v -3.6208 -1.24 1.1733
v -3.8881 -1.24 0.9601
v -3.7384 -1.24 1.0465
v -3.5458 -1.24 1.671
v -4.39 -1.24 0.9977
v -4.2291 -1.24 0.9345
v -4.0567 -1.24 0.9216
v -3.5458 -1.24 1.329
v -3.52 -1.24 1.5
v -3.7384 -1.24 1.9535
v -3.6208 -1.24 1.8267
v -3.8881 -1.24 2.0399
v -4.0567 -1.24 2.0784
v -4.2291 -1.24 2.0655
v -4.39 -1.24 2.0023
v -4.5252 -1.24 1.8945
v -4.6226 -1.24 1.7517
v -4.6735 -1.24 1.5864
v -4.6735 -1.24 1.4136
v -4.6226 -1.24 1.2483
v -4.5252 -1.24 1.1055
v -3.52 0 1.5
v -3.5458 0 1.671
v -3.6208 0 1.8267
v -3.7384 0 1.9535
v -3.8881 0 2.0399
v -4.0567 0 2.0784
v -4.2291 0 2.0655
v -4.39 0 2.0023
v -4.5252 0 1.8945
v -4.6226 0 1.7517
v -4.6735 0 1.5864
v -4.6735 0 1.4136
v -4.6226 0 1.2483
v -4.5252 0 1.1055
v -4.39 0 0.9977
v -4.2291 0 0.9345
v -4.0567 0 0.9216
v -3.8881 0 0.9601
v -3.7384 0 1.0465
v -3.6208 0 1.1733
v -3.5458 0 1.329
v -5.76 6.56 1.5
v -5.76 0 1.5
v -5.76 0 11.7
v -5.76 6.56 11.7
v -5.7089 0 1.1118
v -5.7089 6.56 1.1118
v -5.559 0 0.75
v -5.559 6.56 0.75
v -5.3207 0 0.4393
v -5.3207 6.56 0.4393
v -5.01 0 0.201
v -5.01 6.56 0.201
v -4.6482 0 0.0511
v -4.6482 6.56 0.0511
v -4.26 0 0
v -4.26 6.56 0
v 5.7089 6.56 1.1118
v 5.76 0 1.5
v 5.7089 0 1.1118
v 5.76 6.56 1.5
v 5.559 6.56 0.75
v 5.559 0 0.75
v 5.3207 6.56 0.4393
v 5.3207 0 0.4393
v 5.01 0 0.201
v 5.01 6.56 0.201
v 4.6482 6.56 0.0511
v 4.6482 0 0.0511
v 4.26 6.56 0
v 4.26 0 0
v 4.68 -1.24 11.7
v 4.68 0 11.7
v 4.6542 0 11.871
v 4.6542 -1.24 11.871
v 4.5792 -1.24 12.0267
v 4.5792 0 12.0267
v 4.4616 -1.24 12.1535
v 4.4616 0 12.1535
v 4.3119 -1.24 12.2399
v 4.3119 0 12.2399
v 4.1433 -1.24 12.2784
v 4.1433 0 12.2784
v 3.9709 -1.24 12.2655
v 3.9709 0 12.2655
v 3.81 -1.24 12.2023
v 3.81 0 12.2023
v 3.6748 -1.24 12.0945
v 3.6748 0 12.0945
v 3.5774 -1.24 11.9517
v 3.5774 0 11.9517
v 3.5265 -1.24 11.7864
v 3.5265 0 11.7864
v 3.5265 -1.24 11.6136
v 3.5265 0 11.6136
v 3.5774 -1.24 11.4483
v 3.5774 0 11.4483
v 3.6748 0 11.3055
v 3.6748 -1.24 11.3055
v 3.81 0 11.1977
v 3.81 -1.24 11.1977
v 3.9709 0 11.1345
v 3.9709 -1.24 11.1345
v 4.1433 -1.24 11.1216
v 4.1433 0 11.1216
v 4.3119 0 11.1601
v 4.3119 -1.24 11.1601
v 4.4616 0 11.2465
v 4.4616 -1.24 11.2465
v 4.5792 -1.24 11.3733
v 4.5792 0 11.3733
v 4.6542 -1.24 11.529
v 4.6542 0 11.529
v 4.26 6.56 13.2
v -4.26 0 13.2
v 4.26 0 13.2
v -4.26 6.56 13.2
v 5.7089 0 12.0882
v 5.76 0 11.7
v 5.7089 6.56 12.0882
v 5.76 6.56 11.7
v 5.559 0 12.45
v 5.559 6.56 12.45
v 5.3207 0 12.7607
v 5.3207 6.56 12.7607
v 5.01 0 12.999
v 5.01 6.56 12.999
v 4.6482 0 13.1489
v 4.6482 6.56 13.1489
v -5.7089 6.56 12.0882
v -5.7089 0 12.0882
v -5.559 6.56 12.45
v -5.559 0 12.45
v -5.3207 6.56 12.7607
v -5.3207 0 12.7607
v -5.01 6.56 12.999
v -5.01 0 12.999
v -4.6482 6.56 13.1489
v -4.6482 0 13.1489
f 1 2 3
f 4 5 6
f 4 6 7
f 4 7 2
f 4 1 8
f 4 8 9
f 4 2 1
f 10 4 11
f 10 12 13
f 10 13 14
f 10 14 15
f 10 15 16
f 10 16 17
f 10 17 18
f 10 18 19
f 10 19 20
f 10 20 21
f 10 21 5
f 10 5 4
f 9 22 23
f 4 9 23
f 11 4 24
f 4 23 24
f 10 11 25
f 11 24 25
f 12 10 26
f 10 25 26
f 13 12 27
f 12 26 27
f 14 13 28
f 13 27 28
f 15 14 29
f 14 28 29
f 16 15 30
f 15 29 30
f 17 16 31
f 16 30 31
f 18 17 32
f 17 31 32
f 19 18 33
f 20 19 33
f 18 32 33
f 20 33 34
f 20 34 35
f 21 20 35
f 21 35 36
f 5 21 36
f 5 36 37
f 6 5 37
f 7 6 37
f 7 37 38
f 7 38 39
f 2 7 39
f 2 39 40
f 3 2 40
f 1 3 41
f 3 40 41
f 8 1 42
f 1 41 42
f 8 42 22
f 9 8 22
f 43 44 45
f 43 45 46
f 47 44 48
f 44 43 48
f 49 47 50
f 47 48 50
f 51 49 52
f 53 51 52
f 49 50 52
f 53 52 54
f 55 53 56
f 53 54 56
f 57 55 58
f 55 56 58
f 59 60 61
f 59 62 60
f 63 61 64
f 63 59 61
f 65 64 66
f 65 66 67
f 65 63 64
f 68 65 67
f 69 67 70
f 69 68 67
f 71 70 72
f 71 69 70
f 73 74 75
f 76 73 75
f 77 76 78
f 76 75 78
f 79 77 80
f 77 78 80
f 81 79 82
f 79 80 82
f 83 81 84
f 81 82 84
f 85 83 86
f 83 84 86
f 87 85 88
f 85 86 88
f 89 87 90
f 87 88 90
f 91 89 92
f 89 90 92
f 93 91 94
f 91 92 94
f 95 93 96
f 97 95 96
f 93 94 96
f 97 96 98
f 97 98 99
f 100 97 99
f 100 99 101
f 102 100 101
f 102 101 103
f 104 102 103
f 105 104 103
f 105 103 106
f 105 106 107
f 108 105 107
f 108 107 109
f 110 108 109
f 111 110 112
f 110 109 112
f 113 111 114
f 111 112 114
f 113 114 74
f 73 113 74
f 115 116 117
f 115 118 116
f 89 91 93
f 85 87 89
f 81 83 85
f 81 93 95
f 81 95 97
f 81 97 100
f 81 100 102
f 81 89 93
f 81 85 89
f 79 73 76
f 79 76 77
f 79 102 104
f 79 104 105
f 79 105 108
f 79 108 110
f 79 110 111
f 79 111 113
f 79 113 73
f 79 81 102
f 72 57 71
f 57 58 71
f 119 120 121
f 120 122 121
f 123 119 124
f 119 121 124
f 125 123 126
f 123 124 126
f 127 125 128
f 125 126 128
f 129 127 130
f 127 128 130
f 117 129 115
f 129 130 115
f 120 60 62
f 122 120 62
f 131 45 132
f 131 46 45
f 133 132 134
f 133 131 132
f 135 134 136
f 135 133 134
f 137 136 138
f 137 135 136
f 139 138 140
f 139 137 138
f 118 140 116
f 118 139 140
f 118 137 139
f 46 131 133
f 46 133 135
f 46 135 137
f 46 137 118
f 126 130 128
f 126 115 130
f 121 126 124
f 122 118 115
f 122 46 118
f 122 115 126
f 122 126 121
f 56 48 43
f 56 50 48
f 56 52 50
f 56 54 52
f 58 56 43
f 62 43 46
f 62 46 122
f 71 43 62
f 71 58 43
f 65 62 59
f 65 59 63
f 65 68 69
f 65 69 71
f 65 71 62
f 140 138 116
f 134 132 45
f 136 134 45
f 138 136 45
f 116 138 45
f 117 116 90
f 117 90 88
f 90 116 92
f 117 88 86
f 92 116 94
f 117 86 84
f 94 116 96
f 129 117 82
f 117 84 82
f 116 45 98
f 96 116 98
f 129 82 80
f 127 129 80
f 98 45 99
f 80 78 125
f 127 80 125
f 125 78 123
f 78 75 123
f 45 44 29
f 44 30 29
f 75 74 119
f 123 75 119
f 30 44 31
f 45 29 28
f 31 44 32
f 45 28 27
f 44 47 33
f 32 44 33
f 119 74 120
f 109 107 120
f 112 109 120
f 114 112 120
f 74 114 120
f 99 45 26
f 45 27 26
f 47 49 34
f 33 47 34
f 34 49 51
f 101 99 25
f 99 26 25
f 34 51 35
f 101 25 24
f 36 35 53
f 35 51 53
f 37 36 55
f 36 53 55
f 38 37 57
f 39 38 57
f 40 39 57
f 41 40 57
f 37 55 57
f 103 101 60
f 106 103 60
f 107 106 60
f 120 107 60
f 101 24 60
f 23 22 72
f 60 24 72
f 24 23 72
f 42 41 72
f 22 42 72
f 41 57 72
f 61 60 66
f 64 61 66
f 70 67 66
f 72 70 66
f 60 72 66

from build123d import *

# Parameters (mm, degrees)
CYLINDER006_R     = 0.58
CYLINDER006_DEPTH = 1.24
BOX013_W          = 11.52
BOX013_H          = 6.56
BOX013_DEPTH      = 13.2
FILLET011_R       = 1.5
CYLINDER007_R     = 0.58
CYLINDER007_DEPTH = 1.24


with BuildPart() as cylinder006:
    # Cylinder006 → Cylinder006 (new body)
    with BuildSketch(Plane(origin=(-4.1, 0, 1.5), x_dir=(1, 0, 0), z_dir=(0, -1, 0))):
        Circle(CYLINDER006_R)
    extrude(amount=CYLINDER006_DEPTH)


with BuildPart() as fusion002:
    # Box013 → Box013 (new body)
    with BuildSketch(Plane(origin=(-5.76, 0, 0), x_dir=(1, 0, 0), z_dir=(0, 0, 1))):
        with Locations((5.76, 3.28)):
            Rectangle(BOX013_W, BOX013_H)
    extrude(amount=BOX013_DEPTH)

    # Fillet011
    fillet011_edges = [fusion002.edges().sort_by_distance(p)[0] for p in [
        (-5.76, 3.28, 13.2),
        (-5.76, 3.28, 0),
        (5.76, 3.28, 13.2),
        (5.76, 3.28, 0),
    ]]
    fillet(fillet011_edges, radius=FILLET011_R)

    # Fusion002: union Cylinder006
    add(cylinder006.part)


with BuildPart() as encoderbody:
    # Cylinder007 → Cylinder007 (new body)
    with BuildSketch(Plane(origin=(4.1, 0, 11.7), x_dir=(1, 0, 0), z_dir=(0, -1, 0))):
        Circle(CYLINDER007_R)
    extrude(amount=CYLINDER007_DEPTH)

    # Fusion003: union Fusion002
    add(fusion002.part)


solid = encoderbody.part
